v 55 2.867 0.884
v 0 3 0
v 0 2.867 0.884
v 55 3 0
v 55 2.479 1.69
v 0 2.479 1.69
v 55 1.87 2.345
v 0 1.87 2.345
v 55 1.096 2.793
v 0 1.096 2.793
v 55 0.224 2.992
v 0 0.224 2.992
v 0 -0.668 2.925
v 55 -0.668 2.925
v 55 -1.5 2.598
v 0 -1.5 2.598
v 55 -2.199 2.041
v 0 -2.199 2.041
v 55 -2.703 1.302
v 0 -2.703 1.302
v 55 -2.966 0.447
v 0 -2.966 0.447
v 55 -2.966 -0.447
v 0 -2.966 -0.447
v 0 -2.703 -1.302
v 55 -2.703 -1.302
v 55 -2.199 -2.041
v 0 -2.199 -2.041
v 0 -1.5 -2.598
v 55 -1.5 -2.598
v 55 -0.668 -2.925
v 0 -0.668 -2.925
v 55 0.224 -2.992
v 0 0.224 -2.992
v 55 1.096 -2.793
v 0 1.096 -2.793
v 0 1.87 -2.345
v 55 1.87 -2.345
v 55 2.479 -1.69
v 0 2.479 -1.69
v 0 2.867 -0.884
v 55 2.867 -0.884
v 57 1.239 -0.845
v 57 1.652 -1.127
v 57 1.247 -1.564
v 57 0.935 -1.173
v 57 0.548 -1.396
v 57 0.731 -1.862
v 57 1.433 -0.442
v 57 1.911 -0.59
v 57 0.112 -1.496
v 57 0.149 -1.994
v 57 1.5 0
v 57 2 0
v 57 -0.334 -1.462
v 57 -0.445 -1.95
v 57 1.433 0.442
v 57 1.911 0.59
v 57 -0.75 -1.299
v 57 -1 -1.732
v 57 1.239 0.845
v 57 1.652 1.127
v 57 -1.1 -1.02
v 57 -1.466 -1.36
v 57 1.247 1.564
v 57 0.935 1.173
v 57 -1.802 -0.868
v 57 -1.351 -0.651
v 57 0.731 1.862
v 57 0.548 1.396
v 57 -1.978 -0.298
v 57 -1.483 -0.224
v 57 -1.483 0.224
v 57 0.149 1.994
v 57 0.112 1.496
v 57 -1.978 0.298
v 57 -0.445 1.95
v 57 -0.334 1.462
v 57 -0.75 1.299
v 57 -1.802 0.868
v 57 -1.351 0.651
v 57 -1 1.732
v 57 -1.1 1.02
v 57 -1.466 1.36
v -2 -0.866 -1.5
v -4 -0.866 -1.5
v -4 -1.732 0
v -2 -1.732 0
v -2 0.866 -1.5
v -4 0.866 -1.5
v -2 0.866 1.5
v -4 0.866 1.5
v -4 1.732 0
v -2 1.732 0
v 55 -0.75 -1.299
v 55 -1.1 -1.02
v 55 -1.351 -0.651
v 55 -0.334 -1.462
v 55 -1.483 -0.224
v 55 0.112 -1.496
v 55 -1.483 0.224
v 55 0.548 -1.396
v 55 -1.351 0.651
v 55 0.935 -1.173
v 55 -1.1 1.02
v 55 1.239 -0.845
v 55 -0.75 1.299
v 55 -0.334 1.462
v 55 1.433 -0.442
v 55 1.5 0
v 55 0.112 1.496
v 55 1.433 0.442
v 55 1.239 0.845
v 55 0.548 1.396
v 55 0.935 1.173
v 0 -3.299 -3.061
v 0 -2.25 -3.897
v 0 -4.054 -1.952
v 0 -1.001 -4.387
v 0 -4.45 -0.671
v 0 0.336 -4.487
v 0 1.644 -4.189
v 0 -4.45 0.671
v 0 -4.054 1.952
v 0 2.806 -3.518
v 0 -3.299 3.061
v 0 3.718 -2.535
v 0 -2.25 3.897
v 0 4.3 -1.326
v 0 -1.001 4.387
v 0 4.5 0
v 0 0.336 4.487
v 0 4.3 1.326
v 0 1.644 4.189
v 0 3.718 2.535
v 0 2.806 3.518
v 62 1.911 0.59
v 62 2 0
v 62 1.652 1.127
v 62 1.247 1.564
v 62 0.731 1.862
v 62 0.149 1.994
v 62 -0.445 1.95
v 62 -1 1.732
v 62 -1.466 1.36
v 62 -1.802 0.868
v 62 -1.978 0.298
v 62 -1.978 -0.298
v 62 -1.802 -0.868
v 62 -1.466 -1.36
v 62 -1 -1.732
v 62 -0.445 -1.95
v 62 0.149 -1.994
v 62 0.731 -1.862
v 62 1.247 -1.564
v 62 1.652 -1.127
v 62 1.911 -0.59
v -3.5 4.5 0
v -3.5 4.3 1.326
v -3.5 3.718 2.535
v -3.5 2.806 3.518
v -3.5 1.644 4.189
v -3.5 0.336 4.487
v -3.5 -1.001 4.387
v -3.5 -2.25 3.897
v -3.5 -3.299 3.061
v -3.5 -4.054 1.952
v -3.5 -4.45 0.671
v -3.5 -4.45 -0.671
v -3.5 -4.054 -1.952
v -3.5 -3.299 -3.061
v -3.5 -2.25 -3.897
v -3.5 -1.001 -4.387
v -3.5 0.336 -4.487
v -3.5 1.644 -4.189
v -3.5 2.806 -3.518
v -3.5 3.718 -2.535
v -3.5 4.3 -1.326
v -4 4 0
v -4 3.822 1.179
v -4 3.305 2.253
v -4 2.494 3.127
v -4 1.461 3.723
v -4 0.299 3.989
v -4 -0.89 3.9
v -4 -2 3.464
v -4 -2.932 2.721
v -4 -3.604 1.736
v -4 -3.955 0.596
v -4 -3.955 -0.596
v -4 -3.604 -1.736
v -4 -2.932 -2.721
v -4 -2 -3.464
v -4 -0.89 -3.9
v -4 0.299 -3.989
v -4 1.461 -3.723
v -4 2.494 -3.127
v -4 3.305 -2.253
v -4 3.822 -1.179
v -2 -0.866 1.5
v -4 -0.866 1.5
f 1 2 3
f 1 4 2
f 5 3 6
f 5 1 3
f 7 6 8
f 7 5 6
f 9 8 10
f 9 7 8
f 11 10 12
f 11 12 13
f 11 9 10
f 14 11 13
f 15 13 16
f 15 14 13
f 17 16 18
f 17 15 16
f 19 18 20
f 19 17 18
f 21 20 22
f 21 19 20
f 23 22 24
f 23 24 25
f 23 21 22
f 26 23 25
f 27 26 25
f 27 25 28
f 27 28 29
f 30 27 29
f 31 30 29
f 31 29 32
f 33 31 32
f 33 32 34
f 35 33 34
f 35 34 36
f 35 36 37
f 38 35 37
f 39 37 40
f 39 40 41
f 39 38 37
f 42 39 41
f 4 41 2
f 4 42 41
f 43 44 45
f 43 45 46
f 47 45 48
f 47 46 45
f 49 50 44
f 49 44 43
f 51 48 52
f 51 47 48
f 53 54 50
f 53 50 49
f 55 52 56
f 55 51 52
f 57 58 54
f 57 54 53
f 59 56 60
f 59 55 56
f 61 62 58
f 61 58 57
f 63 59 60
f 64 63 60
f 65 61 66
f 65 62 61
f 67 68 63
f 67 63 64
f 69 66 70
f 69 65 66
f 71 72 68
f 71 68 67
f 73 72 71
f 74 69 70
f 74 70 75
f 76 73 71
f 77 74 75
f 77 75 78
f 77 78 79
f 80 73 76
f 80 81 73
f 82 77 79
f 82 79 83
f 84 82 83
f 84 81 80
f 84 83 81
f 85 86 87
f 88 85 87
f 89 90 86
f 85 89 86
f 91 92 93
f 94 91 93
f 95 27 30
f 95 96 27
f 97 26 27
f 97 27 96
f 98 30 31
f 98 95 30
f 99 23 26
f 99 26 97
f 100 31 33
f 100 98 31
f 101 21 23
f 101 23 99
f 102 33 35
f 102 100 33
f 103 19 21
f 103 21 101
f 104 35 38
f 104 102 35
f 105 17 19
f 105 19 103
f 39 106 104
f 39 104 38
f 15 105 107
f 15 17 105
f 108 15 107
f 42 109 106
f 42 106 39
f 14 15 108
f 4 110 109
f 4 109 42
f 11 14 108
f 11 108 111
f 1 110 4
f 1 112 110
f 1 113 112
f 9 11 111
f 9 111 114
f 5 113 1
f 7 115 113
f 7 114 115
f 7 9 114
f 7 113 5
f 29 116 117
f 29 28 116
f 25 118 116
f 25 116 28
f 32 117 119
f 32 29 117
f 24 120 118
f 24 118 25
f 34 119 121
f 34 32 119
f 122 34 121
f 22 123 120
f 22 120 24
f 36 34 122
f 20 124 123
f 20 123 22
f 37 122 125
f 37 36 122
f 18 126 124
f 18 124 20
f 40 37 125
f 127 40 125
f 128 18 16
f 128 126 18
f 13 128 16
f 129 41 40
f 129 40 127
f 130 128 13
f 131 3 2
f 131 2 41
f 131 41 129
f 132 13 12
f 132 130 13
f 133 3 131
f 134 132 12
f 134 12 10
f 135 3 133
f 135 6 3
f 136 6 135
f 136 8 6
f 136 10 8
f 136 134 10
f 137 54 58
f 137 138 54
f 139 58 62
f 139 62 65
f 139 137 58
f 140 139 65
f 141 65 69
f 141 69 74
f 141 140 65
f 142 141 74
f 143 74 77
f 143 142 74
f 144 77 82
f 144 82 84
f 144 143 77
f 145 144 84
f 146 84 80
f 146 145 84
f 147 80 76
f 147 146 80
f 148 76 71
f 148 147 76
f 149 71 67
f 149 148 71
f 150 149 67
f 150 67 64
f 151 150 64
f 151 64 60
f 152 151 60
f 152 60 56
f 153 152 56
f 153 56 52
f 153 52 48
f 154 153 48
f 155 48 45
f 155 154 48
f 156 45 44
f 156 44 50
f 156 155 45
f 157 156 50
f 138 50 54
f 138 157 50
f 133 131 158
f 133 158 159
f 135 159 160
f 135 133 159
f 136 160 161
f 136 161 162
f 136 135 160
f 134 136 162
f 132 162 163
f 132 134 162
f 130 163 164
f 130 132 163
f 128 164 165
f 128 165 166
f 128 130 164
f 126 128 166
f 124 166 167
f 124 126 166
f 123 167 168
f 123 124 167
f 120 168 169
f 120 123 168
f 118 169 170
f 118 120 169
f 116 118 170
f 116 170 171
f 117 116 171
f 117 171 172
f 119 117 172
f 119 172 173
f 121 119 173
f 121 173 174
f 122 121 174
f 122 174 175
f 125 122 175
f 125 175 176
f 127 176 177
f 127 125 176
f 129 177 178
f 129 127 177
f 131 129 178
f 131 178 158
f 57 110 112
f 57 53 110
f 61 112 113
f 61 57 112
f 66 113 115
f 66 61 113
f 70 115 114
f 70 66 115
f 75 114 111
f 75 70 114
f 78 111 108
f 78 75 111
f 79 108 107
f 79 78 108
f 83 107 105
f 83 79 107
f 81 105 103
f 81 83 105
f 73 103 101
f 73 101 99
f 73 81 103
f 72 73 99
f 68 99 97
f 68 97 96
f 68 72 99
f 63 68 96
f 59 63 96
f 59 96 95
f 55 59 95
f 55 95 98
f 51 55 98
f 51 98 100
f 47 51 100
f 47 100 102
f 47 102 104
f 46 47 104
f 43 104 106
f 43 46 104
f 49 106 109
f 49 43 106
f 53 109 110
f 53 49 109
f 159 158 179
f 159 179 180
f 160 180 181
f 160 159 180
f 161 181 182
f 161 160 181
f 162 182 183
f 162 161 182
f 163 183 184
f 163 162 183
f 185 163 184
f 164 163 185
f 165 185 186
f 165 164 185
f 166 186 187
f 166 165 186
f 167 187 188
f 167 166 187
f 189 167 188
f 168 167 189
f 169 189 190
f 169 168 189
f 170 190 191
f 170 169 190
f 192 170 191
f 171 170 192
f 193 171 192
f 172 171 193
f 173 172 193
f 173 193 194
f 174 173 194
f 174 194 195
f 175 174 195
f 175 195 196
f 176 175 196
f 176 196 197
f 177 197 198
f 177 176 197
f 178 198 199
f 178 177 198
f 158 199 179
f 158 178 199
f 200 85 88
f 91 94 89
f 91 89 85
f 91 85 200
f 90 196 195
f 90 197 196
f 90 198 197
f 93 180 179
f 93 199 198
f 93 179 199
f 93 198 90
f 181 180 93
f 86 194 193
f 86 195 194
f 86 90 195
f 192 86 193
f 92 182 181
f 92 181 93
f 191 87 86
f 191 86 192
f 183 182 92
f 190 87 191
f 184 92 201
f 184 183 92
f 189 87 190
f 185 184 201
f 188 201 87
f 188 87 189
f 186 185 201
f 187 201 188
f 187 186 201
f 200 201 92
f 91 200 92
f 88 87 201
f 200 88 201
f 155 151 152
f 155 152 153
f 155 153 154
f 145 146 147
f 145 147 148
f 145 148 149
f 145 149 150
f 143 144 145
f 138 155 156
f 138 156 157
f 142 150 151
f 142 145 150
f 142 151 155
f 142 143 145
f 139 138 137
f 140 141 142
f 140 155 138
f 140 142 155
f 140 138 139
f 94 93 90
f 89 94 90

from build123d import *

# Parameters (mm, degrees)
CHAMFER2_SIZE      = 0.5
CUT_EXTRUDE1_DEPTH = 2


with BuildPart() as part:
    # Sketch1 → Revolve1 (revolve)
    with BuildSketch(Plane.XY):
        Polygon((0, 3), (55, 3), (55, 1.5), (57, 1.5), (57, 2), (62, 2), (62, 0), (-4, 0), (-4, 4.5), (0, 4.5), align=None)
    revolve(axis=Axis((-15.448246648, 0, 0), (1, 0, 0)))

    # Chamfer2
    chamfer2_edges = [part.edges().sort_by_distance(p)[0] for p in [
        (-4, -4.5, 0),
    ]]
    chamfer(chamfer2_edges, length=CHAMFER2_SIZE)

    # Sketch2 → Cut-Extrude1 (cut)
    with BuildSketch(Plane.ZY.offset(4)):
        Polygon((0, 1.732050808), (-1.5, 0.866025404), (-1.5, -0.866025404), (0, -1.732050808), (1.5, -0.866025404), (1.5, 0.866025404), align=None)
    extrude(amount=-CUT_EXTRUDE1_DEPTH, mode=Mode.SUBTRACT)


solid = part.part
